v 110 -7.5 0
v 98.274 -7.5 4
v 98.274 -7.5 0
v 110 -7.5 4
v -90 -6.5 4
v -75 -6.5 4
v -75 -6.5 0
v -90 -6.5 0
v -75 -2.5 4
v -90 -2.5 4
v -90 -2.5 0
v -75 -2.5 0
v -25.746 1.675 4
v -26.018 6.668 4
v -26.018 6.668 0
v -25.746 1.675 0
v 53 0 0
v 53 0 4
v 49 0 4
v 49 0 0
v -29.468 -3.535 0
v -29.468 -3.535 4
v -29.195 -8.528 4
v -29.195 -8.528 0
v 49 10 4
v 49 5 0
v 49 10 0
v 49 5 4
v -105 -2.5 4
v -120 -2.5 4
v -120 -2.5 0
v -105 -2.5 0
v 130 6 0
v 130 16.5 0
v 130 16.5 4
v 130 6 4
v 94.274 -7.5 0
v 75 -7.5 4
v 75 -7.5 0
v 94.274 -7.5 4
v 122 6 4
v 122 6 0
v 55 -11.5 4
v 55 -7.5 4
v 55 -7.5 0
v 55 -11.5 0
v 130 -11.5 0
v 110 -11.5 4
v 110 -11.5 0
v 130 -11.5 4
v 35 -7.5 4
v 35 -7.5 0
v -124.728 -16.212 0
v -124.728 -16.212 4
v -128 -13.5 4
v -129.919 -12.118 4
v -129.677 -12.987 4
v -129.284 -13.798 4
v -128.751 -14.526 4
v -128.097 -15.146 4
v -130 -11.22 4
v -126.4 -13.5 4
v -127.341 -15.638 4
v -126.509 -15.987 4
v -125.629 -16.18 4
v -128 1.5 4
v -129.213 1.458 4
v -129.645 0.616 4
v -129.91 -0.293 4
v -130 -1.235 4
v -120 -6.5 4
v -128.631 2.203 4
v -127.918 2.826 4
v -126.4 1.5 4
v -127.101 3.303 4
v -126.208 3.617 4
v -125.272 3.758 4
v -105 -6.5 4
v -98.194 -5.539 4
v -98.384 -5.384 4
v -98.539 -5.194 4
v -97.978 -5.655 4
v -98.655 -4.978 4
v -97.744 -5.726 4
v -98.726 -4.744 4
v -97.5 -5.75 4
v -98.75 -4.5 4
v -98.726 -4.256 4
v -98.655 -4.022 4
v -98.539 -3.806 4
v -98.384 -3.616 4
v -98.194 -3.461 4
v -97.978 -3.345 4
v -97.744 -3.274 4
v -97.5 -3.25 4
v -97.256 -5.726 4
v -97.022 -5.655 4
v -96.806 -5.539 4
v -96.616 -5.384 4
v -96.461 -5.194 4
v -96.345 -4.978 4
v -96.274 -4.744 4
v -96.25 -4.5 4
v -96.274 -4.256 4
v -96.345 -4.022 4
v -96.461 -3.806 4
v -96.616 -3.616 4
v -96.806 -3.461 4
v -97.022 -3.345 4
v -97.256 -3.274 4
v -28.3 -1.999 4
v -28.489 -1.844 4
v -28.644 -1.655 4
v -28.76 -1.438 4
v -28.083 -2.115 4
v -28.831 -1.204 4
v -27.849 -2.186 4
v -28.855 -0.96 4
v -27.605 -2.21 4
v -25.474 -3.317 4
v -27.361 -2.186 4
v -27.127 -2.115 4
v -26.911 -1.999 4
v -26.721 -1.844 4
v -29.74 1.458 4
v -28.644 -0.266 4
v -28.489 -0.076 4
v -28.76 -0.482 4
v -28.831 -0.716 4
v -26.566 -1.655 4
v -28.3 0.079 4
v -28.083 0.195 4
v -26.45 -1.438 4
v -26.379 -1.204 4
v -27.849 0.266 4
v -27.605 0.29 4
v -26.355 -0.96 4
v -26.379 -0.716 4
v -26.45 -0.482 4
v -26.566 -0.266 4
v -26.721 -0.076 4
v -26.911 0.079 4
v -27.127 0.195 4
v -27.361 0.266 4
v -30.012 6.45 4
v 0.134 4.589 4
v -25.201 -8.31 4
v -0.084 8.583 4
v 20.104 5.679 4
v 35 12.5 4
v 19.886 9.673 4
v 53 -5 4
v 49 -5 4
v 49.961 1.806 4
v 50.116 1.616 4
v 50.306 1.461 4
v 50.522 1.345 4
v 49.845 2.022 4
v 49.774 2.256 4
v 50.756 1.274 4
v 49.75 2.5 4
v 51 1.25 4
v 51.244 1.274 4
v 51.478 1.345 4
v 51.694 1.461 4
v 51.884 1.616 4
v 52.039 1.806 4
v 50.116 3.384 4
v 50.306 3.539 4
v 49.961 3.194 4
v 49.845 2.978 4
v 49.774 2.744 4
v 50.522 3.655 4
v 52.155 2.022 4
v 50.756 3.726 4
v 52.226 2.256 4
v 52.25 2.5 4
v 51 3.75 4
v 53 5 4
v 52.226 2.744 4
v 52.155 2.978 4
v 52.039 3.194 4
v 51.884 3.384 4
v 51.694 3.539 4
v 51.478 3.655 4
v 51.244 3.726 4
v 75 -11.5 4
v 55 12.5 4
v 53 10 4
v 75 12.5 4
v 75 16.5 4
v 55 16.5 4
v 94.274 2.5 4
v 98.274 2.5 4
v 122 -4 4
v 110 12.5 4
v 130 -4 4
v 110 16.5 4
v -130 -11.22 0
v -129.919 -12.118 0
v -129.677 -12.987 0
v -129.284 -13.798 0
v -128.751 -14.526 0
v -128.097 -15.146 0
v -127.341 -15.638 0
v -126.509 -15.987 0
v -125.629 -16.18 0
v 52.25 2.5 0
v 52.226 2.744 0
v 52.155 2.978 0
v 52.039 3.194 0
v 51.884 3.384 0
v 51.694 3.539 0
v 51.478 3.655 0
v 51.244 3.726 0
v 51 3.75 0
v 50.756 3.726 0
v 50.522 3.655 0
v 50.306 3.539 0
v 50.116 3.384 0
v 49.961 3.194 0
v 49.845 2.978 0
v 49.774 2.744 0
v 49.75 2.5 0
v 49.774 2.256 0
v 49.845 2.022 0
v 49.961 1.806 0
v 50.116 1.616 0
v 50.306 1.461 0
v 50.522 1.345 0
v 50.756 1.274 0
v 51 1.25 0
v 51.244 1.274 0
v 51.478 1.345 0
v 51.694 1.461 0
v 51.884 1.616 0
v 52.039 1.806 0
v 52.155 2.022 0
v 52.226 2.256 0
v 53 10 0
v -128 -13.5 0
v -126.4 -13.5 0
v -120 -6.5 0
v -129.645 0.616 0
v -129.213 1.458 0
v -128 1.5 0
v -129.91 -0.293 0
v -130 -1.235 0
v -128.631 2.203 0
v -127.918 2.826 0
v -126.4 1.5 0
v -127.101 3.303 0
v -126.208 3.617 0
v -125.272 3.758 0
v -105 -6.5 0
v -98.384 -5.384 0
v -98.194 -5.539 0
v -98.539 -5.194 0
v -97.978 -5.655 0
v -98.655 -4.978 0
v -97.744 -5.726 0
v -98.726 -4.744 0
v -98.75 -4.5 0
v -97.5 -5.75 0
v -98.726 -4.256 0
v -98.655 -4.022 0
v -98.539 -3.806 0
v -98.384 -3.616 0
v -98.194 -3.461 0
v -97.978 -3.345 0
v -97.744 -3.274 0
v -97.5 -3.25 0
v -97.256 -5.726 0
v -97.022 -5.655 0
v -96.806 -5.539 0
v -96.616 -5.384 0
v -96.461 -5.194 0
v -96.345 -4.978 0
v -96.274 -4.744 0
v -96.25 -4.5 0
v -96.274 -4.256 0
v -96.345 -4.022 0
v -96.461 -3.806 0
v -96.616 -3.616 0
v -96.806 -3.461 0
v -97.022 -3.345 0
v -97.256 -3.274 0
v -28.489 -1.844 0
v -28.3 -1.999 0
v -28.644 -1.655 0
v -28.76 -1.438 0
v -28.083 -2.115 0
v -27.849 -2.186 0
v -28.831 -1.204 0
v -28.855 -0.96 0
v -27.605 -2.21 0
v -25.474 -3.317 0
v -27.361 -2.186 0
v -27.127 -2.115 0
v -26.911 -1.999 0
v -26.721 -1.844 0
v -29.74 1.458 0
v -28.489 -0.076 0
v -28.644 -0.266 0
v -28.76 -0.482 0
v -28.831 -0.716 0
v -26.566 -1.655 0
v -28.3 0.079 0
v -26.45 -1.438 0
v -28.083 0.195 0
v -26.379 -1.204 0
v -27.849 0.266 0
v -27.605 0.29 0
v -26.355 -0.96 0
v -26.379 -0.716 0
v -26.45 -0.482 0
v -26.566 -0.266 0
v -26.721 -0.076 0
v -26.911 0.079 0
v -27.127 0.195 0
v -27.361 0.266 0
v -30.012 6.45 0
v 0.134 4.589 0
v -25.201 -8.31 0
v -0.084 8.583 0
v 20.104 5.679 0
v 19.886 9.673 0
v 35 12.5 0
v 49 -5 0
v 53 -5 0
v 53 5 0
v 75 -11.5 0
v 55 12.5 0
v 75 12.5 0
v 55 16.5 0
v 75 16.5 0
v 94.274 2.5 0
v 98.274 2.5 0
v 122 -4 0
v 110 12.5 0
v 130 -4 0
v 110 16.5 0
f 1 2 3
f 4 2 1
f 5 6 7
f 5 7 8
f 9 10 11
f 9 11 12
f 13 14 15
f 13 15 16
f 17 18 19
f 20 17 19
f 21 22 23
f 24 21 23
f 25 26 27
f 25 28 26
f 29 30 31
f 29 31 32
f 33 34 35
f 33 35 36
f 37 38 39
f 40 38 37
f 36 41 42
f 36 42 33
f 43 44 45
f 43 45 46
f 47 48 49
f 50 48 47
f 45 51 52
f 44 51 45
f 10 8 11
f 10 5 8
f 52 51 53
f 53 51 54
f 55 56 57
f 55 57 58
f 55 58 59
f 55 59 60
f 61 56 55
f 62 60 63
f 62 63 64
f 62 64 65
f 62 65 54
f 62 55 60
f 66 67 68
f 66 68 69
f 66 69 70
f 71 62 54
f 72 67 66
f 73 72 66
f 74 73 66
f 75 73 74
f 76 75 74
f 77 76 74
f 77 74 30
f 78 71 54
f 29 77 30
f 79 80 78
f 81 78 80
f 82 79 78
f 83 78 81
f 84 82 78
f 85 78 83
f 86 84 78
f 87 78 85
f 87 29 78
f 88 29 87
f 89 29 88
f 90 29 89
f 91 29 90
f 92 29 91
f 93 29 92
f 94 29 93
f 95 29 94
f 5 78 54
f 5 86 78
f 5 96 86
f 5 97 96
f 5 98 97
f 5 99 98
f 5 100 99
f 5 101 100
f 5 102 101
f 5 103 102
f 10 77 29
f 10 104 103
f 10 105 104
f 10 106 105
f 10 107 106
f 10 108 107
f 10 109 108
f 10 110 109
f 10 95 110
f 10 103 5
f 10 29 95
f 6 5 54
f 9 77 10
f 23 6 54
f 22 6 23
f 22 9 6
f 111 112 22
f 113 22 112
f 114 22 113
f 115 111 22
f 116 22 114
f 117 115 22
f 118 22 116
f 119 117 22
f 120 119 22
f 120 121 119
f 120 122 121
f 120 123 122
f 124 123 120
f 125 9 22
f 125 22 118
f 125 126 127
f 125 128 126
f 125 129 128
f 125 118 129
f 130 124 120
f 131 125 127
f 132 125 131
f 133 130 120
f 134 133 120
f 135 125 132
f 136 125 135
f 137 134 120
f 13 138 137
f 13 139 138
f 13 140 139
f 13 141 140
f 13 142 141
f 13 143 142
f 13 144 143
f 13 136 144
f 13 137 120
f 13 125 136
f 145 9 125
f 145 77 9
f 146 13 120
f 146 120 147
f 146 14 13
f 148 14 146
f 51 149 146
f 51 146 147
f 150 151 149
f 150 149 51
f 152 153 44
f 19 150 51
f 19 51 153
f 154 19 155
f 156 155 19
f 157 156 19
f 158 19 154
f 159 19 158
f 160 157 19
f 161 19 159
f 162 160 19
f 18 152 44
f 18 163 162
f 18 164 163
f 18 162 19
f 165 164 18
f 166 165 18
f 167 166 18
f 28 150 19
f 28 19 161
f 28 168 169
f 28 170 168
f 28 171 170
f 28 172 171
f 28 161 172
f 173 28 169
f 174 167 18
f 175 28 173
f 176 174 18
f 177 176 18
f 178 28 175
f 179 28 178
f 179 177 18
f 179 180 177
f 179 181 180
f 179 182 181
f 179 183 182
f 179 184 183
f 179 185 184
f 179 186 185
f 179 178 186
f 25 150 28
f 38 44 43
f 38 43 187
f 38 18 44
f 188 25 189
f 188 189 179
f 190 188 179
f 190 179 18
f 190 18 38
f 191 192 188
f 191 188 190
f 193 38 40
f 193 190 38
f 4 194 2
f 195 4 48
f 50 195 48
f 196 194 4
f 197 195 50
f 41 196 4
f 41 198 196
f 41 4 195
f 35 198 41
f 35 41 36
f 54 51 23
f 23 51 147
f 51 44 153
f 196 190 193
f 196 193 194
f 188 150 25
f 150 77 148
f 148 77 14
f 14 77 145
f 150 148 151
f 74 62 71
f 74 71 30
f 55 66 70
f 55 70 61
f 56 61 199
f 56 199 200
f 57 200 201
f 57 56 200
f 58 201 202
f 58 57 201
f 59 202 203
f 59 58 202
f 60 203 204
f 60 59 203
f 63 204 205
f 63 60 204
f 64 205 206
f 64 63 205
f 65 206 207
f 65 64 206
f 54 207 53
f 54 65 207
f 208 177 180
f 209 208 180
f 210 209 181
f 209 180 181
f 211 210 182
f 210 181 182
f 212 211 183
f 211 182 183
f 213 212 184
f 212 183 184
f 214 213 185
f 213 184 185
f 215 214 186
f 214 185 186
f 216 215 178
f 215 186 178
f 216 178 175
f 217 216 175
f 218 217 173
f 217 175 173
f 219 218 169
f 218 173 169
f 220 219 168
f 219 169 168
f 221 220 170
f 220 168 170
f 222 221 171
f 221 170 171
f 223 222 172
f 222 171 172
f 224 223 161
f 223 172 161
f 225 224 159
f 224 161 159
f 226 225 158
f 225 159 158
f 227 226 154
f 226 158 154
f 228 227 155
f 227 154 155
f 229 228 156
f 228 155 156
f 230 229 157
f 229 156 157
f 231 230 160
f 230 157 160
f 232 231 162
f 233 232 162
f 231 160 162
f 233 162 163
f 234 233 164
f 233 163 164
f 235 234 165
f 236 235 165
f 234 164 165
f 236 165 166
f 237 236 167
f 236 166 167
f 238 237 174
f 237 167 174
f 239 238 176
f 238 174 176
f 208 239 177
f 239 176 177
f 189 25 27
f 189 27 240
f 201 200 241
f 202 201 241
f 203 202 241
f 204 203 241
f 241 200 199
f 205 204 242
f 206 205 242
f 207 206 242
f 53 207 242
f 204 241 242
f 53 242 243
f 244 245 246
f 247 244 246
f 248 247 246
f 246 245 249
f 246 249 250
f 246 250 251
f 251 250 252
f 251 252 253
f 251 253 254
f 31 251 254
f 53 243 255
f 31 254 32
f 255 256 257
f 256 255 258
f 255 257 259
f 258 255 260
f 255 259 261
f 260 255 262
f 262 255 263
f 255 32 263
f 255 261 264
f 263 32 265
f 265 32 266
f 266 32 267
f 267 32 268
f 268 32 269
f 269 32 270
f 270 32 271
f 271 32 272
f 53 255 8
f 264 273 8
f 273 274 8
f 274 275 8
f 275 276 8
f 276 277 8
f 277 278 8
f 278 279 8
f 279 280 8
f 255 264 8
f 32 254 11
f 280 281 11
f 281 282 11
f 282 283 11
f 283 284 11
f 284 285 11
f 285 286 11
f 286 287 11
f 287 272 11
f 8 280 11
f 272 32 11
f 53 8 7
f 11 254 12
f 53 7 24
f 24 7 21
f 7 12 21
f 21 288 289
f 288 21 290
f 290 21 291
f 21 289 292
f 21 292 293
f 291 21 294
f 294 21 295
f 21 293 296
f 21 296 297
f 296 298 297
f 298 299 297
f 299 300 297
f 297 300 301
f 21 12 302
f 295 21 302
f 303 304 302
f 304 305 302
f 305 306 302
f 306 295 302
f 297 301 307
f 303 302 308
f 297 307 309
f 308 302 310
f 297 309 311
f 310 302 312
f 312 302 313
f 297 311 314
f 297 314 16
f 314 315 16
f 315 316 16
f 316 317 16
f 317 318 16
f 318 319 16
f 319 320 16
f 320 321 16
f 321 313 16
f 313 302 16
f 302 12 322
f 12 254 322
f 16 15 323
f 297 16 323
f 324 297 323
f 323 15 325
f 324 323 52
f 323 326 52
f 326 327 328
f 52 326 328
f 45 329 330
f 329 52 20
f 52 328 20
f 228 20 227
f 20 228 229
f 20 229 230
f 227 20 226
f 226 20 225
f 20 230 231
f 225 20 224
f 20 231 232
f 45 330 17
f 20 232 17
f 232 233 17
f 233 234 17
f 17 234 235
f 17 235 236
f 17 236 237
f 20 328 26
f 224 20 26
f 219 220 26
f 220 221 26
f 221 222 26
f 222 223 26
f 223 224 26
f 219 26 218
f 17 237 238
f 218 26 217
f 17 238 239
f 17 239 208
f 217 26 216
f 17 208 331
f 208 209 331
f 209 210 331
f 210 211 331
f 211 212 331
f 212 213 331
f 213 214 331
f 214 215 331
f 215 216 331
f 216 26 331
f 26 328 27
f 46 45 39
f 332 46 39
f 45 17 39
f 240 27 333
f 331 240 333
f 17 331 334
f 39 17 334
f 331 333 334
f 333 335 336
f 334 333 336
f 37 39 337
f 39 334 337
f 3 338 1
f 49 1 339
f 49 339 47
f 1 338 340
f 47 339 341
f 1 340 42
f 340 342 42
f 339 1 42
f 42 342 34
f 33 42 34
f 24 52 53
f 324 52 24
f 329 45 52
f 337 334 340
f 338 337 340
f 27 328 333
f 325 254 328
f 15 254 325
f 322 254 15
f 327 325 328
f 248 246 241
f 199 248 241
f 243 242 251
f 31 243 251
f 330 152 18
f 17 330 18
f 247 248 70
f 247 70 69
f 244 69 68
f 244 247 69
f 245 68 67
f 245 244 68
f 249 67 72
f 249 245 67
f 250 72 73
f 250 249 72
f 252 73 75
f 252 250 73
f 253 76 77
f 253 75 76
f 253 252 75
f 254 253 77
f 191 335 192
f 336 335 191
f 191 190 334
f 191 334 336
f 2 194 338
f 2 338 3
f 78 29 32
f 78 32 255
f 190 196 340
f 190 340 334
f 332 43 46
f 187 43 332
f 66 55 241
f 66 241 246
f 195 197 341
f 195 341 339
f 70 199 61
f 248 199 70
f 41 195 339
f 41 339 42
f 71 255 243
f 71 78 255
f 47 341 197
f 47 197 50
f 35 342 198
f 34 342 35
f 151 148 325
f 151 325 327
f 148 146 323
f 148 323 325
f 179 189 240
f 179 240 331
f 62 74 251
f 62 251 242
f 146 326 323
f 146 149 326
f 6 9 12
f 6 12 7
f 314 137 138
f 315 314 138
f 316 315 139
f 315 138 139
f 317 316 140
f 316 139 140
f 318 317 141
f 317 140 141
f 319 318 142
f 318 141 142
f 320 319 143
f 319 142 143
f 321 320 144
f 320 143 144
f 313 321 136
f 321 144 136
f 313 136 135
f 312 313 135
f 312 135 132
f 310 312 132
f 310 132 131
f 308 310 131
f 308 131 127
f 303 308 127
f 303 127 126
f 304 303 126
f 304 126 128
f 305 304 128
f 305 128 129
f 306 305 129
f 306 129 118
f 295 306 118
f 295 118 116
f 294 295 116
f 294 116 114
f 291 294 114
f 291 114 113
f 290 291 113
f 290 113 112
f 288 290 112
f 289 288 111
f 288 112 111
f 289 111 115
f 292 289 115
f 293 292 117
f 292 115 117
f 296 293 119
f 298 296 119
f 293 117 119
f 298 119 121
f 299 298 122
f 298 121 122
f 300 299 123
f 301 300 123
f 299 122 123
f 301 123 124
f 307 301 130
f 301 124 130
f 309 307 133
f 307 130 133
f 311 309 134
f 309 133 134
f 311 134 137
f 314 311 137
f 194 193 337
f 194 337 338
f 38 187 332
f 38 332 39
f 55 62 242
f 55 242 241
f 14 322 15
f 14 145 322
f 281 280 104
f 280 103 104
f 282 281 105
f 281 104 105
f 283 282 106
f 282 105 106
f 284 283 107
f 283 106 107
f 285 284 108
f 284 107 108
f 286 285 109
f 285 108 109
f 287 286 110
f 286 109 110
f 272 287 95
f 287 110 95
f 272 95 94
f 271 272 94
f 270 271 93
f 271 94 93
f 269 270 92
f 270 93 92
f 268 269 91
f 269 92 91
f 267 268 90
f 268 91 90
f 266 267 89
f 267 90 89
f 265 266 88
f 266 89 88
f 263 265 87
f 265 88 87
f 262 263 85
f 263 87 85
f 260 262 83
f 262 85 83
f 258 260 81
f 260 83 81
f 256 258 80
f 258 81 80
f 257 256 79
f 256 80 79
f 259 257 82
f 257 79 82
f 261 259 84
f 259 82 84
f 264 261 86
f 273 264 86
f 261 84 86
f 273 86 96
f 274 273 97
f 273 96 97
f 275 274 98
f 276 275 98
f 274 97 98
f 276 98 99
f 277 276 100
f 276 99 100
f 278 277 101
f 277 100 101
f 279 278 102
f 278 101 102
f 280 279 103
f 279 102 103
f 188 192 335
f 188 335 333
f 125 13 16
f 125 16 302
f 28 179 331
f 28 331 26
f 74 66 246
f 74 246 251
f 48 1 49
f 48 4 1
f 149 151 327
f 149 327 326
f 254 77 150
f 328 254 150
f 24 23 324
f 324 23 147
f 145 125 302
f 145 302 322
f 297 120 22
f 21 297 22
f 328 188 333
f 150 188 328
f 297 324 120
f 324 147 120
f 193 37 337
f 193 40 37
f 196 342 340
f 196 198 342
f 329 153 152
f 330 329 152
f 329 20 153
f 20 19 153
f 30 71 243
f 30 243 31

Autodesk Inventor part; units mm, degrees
ref_plane "YZ Plane" through (0, 0, 0) normal (1, 0, 0) x (0, 1, 0)
ref_plane "XZ Plane" through (0, 0, 0) normal (0, 1, 0) x (-1, 0, 0)
ref_plane "XY Plane" through (0, 0, 0) normal (0, 0, 1) x (1, 0, 0)
sketch "Sketch1" plane through (0, 0, 0) normal (0, 0, 1) x (1, 0, 0)
  line L0 (-130, 16.5) -> (130, 16.5)
  line L1 (130, 16.5) -> (130, -16.5)
  line L2 (130, -16.5) -> (-130, -16.5)
  line L3 (-130, -16.5) -> (-130, 16.5)
  point P0 (0, 0)
  dimension "d0" = 260
  dimension "d1" = 33
  dimension "d2" = 16.5
  dimension "d3" = 130
extrude "Base" add sketch "Sketch1" along normal blind 4
sketch "Sketch2" plane through (0, 0, 4) normal (0, 0, 1) x (1, 0, 0)
  line L0 (130, 16.5) -> (130, -16.5) projected
  line L1 (-130, 16.5) -> (130, 16.5) projected
  line L2 (-130, -16.5) -> (-130, 16.5) projected
  line L3 (130, -16.5) -> (-130, -16.5) projected
  line L4 (75, 16.5) -> (110, 16.5)
  line L5 (110, 16.5) -> (110, 12.5)
  line L6 (110, 12.5) -> (75, 12.5)
  line L7 (75, 12.5) -> (75, 16.5)
  line L8 (-130, 16.5) -> (55, 16.5)
  line L9 (55, 16.5) -> (55, 12.5)
  line L10 (55, 12.5) -> (-130, 12.5)
  line L11 (-130, 12.5) -> (-130, 16.5)
  line L12 (35, -7.5) -> (55, -7.5)
  line L13 (55, -7.5) -> (55, -16.5)
  line L14 (55, -16.5) -> (35, -16.5)
  line L15 (35, -16.5) -> (35, -7.5)
  line L16 (75, -7.5) -> (110, -7.5)
  line L17 (110, -7.5) -> (110, -16.5)
  line L18 (110, -16.5) -> (75, -16.5)
  line L19 (75, -16.5) -> (75, -7.5)
  line L20 (110, -11.5) -> (130, -11.5)
  line L21 (130, -11.5) -> (130, -16.5)
  line L22 (130, -16.5) -> (110, -16.5)
  line L23 (110, -16.5) -> (110, -11.5)
  line L24 (55, -11.5) -> (75, -11.5)
  line L25 (75, -11.5) -> (75, -16.5)
  line L26 (75, -16.5) -> (55, -16.5)
  line L27 (55, -16.5) -> (55, -11.5)
  point P0 (0, 0)
  dimension "d6" = 35
  dimension "d7" = 4
  dimension "d8" = 0
  dimension "d9" = 20
  dimension "d10" = 185
  dimension "d11" = 4
  dimension "d12" = 0
  dimension "d13" = 0
  dimension "d14" = 20
  dimension "d15" = 20
  dimension "d16" = 9
  dimension "d17" = 0
  dimension "d18" = 165
  dimension "d19" = 35
  dimension "d20" = 9
  dimension "d21" = 0
  dimension "d22" = 20
  dimension "d23" = 20
  dimension "d24" = 5
  dimension "d25" = 20
  dimension "d26" = 5
  dimension "d27" = 0
  dimension "d28" = 0
  dimension "d29" = 0
  dimension "d30" = 0
  dimension "d98" = 20
extrude "StructureMounting" cut sketch "Sketch2" against normal blind 4 contours L0 L3 L17 L20 | L5 L6 L7 L1 | L17 L3 L19 L16 | L9 L10 L2 L1 | L3 L13 L24 L19 | L3 L15 L12 L13
sketch "Sketch4" plane through (0, 0, 4) normal (0, 0, 1) x (1, 0, 0)
  line L0 (55, 12.5) -> (-130, 12.5) projected
  line L1 (-130, -16.5) -> (-130, 12.5) projected
  line L2 (35, -16.5) -> (-130, -16.5) projected
  line L3 (35, -16.5) -> (35, -7.5) projected
  line L4 (55, 16.5) -> (55, 12.5) projected
  line L5 (35, -7.5) -> (-130, -16.5)
  line L6 (-130, 3.5) -> (35, 12.5)
  point P0 (0, 0)
  dimension "d42" = 20
  dimension "d43" = 20
extrude "MotorRamp" cut sketch "Sketch4" against normal blind 4
sketch "Sketch5" plane through (0, 0, 4) normal (0, 0, 1) x (1, 0, 0)
  line L0 (110, 12.5) -> (75, 12.5) projected
  line L1 (75, 12.5) -> (75, 16.5) projected
  line L2 (94.274, 12.5) -> (98.274, 12.5)
  line L3 (98.274, 12.5) -> (98.274, 2.5)
  line L4 (98.274, 2.5) -> (94.274, 2.5)
  line L5 (94.274, 2.5) -> (94.274, 12.5)
  line L6 (110, 16.5) -> (110, 12.5) projected
  point P0 (0, 0)
  dimension "d46" = 4
  dimension "d47" = 10
  dimension "d48" = 0
  dimension "d49" = 19.274
  dimension "d100" = 11.726
extrude "LowSleeve" [suppressed]
sketch "Sketch6" plane through (0, 0, 4) normal (0, 0, 1) x (1, 0, 0)
  line L0 (-130, -16.5) -> (-130, 3.5) projected
  line L1 (-120, -2.5) -> (-105, -2.5)
  line L2 (-105, -2.5) -> (-105, -6.5)
  line L3 (-105, -6.5) -> (-120, -6.5)
  line L4 (-120, -6.5) -> (-120, -2.5)
  line L5 (-90, -2.5) -> (-75, -2.5)
  line L6 (-75, -2.5) -> (-75, -6.5)
  line L7 (-75, -6.5) -> (-90, -6.5)
  line L8 (-90, -6.5) -> (-90, -2.5)
  line L9 (98.274, 2.5) -> (94.274, 2.5) projected
  line L10 (-106.4171, -4.5) -> (-87.4505, -4.5) construction
  circle A0 centre (-97.5, -4.5) radius 1.25
  point P0 (0, 0)
  dimension "d63" = 15
  dimension "d64" = 4
  dimension "d67" = 30
  dimension "d72" = 10
  dimension "d73" = 10
  dimension "d166" = 2
  dimension "d167" = 2.5
  dimension "d168" = 7.5
extrude "MotorSleeves" cut sketch "Sketch6" against normal blind 4
sketch "Sketch10" plane through (0, 0, 4) normal (0, 0, 1) x (1, 0, 0)
  line L0 (130, 16.5) -> (130, -11.5) projected
  line L1 (122, 6) -> (130, 6)
  line L2 (130, 6) -> (130, -4)
  line L3 (130, -4) -> (122, -4)
  line L4 (122, -4) -> (122, 6)
  point P0 (0, 0)
  dimension "d109" = 8
  dimension "d110" = 10
  dimension "d111" = 0
  dimension "d112" = 4
extrude "Cabling" cut sketch "Sketch10" against normal blind 4
sketch "Sketch12" plane through (0, 0, 4) normal (0, 0, 1) x (1, 0, 0)
  line L0 (35, 12.5) -> (-130, 3.5) projected
  line L1 (-0.084, 8.5834) -> (19.8863, 9.6726)
  line L2 (19.8863, 9.6726) -> (20.1041, 5.6786)
  line L3 (20.1041, 5.6786) -> (0.1338, 4.5893)
  line L4 (0.1338, 4.5893) -> (-0.084, 8.5834)
  point P0 (0, 0)
  dimension "d124" = 4
  dimension "d125" = 20
  dimension "d126" = 2
  dimension "d127" = 130
extrude "ESCholder" cut sketch "Sketch12" against normal blind 4
sketch "Sketch13" plane through (0, 0, 4) normal (0, 0, 1) x (1, 0, 0)
  line L0 (55, 16.5) -> (55, 12.5) projected
  line L1 (55, 12.5) -> (35, 12.5) projected
  line L2 (35, 12.5) -> (-130, 3.5) projected
  line L3 (-130, -16.5) -> (35, -7.5) projected
  line L4 (-30.0123, 6.4502) -> (-26.0182, 6.668)
  line L5 (-26.0182, 6.668) -> (-25.7459, 1.6754)
  line L6 (-25.7459, 1.6754) -> (-29.7399, 1.4576)
  line L7 (-29.7399, 1.4576) -> (-30.0123, 6.4502)
  line L8 (-47.5366, -2.0169) -> (-6.9954, 0.1945) construction
  line L9 (-29.1953, -8.5276) -> (-25.2012, -8.3097)
  line L10 (-25.2012, -8.3097) -> (-25.4736, -3.3171)
  line L11 (-25.4736, -3.3171) -> (-29.4676, -3.535)
  line L12 (-29.4676, -3.535) -> (-29.1953, -8.5276)
  line L13 (20.1041, 5.6786) -> (0.1338, 4.5893) projected
  line L14 (-27.9377, 5.1382) -> (-27.2725, -7.0585) construction
  circle A0 centre (-27.6051, -0.9601) radius 1.25
  line L15 (49, 10) -> (53, 10)
  line L16 (53, 10) -> (53, 5)
  line L17 (53, 5) -> (49, 5)
  line L18 (49, 5) -> (49, 10)
  line L19 (39.5253, 2.5) -> (63.8345, 2.5) construction
  line L20 (49, -5) -> (53, -5)
  line L21 (53, -5) -> (53, 0)
  line L22 (53, 0) -> (49, 0)
  line L23 (49, 0) -> (49, -5)
  circle A1 centre (51, 2.5) radius 1.25
  point P0 (0, 0)
  dimension "d134" = 2.5
  dimension "d135" = 7.5
  dimension "d136" = 4
  dimension "d137" = 100
  dimension "d140" = 10
  dimension "d151" = 2
  dimension "d152" = 2.5
  dimension "d153" = 4
  dimension "d154" = 5
  dimension "d155" = 2.5
  dimension "d156" = 6
  dimension "d157" = 10
  dimension "d158" = 2.5
  dimension "d159" = 2
extrude "CrossSupports" cut sketch "Sketch13" against normal blind 10
sketch "Sketch14" plane through (0, 0, 4) normal (0, 0, 1) x (1, 0, 0)
  line L0 (110, 12.5) -> (75, 12.5) projected
  circle A0 centre (113, 8) radius 3
  circle A1 centre (105, 8) radius 3
  point P0 (98.274, 12.5)
  point P1 (0, 0)
  dimension "d141" = 6
  dimension "d142" = 6
  dimension "d143" = 4.5
  dimension "d144" = 4.5
  dimension "d145" = 3
  dimension "d146" = 8
extrude "ESCpowerHoles" [suppressed]
sketch "Sketch15" plane through (0, 0, 4) normal (0, 0, 1) x (1, 0, 0)
  line L0 (75, -7.5) -> (110, -7.5) projected
  line L1 (94.274, 2.5) -> (98.274, 2.5)
  line L2 (98.274, 2.5) -> (98.274, -7.5)
  line L3 (98.274, -7.5) -> (94.274, -7.5)
  line L4 (94.274, -7.5) -> (94.274, 2.5)
  point P0 (0, 0)
extrude "HighSleeve" cut sketch "Sketch15" against normal blind 10
sketch "Sketch16" plane through (0, 0, 4) normal (0, 0, 1) x (1, 0, 0)
  line L0 (-130, -16.5) -> (-130, 3.5) projected
  line L1 (-128, 1.5) -> (-126.4, 1.5)
  line L2 (-126.4, 1.5) -> (-126.4, -13.5)
  line L3 (-126.4, -13.5) -> (-128, -13.5)
  line L4 (-128, -13.5) -> (-128, 1.5)
  point P0 (0, 0)
  dimension "d160" = 1.6
  dimension "d161" = 15
  dimension "d162" = 2
  dimension "d163" = 2
extrude "WingLedCutout" cut sketch "Sketch16" against normal blind 10
fillet "ImpactReduction" radius 5 2 edges at (-130, 3.5, 2) (-130, -16.5, 2)
properties part number "ArmInsideHigh"
